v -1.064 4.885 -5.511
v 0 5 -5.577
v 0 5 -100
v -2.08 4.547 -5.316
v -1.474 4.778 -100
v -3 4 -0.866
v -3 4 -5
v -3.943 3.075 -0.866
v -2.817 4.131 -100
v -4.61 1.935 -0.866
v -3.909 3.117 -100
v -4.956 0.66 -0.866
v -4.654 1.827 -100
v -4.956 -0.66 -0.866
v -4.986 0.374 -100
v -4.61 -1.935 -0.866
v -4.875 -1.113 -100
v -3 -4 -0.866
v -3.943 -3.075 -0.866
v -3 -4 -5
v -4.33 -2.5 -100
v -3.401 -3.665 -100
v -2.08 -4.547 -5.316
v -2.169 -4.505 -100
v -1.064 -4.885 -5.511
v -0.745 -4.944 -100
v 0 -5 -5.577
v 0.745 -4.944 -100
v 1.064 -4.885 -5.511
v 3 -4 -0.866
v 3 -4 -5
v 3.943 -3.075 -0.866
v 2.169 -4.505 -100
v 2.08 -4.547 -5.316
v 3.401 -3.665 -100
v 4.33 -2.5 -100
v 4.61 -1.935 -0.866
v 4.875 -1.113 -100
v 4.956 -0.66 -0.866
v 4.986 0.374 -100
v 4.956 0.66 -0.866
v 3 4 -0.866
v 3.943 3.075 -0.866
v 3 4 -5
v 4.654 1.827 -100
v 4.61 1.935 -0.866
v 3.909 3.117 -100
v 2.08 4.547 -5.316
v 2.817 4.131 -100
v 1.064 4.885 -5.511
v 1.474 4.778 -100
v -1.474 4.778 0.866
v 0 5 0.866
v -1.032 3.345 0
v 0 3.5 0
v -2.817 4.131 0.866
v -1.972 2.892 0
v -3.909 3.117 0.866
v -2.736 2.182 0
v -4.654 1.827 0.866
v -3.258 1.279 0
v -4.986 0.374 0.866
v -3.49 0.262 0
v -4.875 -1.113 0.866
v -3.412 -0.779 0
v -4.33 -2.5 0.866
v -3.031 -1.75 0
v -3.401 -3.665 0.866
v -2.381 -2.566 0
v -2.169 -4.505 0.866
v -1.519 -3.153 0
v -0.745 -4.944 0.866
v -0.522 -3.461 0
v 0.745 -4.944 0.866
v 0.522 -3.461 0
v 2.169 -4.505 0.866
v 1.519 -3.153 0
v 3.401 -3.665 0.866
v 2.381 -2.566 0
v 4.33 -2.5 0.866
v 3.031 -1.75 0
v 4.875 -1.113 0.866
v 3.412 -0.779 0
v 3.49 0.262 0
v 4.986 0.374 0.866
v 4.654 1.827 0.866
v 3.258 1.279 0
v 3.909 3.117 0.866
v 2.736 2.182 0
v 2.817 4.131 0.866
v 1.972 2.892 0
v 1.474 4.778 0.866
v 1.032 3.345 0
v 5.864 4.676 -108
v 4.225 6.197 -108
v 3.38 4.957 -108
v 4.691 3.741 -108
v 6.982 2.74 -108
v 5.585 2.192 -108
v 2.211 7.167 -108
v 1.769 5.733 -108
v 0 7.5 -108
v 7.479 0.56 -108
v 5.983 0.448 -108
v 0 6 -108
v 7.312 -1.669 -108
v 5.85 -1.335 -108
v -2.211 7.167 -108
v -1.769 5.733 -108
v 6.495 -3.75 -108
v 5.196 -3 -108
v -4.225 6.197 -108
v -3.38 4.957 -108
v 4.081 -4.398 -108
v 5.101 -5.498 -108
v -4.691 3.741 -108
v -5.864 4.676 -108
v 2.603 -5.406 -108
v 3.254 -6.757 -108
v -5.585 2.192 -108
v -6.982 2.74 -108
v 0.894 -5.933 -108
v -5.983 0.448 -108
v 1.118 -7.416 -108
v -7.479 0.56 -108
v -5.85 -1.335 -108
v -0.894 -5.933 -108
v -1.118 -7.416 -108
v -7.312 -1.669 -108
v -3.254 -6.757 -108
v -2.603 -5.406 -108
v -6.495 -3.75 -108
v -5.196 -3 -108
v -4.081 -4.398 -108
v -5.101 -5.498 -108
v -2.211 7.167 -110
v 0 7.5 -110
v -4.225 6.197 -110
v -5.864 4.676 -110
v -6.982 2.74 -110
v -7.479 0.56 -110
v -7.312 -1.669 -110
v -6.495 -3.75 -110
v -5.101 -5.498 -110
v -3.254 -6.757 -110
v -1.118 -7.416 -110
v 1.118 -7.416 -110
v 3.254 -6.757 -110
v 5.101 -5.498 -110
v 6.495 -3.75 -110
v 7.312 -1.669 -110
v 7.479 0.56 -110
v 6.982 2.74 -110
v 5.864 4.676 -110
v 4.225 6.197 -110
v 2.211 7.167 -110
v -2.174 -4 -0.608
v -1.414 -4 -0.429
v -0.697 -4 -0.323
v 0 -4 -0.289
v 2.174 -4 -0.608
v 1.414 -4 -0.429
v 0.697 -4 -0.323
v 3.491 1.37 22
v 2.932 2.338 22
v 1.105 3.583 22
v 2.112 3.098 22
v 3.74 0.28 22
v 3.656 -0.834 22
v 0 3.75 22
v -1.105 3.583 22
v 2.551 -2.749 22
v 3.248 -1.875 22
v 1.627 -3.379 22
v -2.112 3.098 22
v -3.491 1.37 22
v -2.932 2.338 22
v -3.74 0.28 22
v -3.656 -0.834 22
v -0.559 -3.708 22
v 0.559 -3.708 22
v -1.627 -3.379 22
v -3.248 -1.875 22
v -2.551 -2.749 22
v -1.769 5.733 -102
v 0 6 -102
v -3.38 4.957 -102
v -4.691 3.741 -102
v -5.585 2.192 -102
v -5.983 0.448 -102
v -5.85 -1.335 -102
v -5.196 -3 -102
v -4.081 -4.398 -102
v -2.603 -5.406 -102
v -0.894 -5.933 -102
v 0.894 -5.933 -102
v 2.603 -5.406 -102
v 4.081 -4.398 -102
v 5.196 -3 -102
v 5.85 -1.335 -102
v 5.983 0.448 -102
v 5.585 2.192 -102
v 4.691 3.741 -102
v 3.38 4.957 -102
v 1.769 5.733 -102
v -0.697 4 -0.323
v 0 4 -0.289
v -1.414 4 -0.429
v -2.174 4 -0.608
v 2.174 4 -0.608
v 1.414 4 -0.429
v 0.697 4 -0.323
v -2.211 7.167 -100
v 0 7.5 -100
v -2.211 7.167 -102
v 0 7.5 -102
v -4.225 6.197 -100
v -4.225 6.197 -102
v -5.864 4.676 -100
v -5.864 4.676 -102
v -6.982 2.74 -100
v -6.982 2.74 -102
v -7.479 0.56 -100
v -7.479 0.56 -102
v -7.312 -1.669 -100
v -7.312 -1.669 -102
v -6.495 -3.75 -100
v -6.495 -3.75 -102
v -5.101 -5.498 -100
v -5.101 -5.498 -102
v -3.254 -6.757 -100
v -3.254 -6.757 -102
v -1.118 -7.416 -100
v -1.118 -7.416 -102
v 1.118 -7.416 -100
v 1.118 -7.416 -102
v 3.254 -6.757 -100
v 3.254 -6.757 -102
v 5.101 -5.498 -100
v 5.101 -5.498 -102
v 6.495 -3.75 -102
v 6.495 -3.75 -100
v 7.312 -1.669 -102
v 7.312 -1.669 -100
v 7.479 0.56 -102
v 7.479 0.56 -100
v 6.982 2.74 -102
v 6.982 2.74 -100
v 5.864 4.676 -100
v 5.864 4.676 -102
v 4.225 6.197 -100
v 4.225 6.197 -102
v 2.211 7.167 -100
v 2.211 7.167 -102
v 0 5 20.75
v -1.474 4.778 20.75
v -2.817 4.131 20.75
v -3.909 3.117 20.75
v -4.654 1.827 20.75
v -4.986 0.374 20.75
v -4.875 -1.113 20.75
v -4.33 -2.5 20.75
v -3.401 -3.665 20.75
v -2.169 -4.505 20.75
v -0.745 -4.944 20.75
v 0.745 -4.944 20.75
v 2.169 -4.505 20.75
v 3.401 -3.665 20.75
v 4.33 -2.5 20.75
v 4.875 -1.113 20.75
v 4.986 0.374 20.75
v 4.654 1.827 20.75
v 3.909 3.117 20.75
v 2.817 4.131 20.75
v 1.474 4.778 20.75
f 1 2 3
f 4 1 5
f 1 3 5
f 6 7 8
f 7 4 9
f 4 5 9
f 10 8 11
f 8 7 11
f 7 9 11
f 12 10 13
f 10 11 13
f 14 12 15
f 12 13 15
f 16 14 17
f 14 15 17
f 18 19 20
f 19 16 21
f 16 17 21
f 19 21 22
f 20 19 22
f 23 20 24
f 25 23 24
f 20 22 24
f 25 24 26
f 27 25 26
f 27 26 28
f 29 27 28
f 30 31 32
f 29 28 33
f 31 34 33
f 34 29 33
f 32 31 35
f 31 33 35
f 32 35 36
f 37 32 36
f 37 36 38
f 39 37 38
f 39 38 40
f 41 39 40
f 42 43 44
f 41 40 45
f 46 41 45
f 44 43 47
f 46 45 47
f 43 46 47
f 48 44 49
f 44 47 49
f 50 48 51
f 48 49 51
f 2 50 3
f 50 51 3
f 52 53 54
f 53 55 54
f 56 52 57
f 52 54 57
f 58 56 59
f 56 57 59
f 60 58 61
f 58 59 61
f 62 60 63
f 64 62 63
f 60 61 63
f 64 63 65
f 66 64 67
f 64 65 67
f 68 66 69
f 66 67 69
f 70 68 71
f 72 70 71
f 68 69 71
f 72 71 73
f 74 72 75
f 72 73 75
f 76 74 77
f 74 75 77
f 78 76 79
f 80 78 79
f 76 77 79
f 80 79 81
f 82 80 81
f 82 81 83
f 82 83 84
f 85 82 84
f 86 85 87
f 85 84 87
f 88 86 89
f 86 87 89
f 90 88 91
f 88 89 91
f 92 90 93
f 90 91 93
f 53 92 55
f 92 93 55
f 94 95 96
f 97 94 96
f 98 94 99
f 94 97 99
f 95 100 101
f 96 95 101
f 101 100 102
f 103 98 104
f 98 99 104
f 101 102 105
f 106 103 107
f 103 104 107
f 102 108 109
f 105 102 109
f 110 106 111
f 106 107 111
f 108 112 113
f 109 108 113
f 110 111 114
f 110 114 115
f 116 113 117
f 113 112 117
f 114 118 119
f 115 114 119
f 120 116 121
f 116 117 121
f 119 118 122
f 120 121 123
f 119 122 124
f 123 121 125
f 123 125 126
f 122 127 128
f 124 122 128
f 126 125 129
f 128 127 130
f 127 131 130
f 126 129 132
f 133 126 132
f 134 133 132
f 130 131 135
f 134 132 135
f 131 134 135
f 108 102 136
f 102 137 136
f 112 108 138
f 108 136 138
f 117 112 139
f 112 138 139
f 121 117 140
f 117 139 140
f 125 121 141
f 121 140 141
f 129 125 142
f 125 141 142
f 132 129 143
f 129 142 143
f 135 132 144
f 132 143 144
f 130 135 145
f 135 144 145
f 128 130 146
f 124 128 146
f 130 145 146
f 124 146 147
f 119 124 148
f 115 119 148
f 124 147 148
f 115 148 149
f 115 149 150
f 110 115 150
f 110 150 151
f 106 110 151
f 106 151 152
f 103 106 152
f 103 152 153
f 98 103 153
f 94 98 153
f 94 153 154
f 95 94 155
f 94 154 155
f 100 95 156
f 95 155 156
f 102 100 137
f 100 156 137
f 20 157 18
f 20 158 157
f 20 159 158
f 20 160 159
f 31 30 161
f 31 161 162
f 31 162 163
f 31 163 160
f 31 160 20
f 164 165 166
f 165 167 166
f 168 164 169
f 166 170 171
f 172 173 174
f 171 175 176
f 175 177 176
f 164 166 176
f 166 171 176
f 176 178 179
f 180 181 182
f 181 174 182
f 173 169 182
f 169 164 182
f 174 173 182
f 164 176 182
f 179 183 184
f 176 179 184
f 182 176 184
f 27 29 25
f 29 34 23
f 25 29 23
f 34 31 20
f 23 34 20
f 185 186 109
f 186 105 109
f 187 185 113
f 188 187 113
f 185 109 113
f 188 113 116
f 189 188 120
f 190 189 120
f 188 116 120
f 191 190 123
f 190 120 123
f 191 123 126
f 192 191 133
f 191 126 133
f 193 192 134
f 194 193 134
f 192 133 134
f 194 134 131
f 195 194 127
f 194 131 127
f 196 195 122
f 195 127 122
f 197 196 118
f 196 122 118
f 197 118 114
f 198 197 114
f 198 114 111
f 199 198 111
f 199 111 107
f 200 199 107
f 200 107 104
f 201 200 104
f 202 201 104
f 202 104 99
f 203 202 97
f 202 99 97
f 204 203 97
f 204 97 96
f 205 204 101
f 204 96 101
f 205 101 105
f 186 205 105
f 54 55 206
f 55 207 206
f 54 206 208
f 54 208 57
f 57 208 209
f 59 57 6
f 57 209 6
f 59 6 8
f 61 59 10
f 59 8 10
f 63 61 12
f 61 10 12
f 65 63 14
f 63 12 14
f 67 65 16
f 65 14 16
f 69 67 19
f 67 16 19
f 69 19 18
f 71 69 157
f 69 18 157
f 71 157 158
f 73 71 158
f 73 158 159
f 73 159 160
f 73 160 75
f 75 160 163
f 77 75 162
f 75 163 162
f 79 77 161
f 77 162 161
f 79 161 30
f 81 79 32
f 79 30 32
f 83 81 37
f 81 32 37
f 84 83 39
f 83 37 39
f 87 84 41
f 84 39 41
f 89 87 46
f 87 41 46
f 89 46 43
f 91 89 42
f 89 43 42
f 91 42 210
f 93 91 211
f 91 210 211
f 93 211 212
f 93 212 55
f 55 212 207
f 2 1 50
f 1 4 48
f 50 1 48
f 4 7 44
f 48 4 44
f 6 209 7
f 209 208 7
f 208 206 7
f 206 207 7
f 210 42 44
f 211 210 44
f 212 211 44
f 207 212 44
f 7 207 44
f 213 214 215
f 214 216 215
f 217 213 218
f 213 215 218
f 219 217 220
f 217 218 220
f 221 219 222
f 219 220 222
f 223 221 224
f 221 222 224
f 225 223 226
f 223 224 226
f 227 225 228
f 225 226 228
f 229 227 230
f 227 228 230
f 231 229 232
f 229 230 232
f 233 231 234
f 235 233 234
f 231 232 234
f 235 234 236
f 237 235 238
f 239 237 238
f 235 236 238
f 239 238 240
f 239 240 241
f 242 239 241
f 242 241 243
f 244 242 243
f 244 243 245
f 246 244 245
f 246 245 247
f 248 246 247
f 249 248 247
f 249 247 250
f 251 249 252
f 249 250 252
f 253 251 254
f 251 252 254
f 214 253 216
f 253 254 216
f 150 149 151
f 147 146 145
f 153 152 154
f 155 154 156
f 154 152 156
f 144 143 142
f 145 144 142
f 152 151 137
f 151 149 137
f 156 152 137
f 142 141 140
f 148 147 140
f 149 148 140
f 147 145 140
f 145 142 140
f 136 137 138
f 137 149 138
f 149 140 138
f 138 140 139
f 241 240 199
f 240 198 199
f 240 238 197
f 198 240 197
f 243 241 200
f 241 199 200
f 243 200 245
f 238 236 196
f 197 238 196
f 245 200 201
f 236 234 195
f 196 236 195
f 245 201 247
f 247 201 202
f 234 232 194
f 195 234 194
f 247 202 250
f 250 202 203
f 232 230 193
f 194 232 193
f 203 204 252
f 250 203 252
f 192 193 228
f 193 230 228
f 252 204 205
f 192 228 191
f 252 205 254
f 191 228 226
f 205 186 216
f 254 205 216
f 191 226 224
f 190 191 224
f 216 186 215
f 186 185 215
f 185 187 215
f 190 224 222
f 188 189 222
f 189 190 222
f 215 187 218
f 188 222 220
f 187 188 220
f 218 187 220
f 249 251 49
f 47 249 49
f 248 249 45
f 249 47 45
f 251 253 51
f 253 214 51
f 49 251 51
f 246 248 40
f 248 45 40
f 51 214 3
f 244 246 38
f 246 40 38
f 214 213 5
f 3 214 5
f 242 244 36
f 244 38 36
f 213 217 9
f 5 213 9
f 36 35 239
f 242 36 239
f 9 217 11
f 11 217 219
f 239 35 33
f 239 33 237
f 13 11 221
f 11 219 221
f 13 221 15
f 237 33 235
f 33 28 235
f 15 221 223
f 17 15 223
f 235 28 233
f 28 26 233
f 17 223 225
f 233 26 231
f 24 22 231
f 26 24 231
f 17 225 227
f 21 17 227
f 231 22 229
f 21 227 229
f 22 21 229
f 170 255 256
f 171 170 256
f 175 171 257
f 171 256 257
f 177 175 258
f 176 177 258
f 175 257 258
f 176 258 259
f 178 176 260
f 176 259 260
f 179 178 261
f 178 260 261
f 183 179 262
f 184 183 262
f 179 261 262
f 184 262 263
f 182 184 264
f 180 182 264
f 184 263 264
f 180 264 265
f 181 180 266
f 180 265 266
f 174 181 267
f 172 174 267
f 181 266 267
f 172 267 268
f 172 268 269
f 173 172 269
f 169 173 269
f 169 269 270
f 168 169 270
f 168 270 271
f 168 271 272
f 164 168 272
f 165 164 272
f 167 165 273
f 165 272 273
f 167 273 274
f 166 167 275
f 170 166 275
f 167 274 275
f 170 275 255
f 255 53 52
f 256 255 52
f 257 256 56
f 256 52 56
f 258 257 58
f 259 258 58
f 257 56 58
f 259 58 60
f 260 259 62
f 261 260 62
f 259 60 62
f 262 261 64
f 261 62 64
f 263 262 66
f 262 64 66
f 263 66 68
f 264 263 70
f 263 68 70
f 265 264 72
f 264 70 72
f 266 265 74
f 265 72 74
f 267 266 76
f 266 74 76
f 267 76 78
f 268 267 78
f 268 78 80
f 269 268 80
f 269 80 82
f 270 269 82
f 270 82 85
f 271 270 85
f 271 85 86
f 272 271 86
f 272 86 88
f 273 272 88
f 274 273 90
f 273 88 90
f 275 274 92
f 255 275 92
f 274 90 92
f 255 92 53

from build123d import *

# Parameters (mm, degrees)
SMUSSO1_SIZE                  = 1.25
TAGLIO_ESTRUSIONE1_DEPTH      = 8.5
TAGLIO_ESTRUSIONE1_DEPTH_BACK = 8.5


with BuildPart() as part:
    # Schizzo1 → Rivoluzione1 (revolve)
    with BuildSketch(Plane(origin=(0, 0, 0), x_dir=(0, 0, -1), z_dir=(1, 0, 0))):
        Polygon((0, 0), (-22, 0), (-22, 5), (-0.866025404, 5), (0, 3.5), (0.866025404, 5), (100, 5), (100, 7.5), (102, 7.5), (102, 6), (108, 6), (108, 7.5), (110, 7.5), (110, 0), align=None)
    revolve(axis=Axis((0, 0, 22), (0, 0, 1)))

    # Smusso1
    smusso1_edges = [part.edges().sort_by_distance(p)[0] for p in [
        (0, -5, 22),
    ]]
    chamfer(smusso1_edges, length=SMUSSO1_SIZE)

    # Schizzo2 → Taglio-Estrusione1 (cut, two sides)
    with BuildSketch(Plane(origin=(0, 0, 0), x_dir=(0, 0, -1), z_dir=(1, 0, 0))) as taglio_estrusione1_sk:
        Polygon((5.577350269, 5), (0, 5), (0, 4), (5, 4), align=None)
        Polygon((0, -5), (0, -4), (5, -4), (5.577350269, -5), align=None)
    extrude(amount=TAGLIO_ESTRUSIONE1_DEPTH, mode=Mode.SUBTRACT)
    extrude(taglio_estrusione1_sk.sketch, amount=-TAGLIO_ESTRUSIONE1_DEPTH_BACK, mode=Mode.SUBTRACT)


solid = part.part
